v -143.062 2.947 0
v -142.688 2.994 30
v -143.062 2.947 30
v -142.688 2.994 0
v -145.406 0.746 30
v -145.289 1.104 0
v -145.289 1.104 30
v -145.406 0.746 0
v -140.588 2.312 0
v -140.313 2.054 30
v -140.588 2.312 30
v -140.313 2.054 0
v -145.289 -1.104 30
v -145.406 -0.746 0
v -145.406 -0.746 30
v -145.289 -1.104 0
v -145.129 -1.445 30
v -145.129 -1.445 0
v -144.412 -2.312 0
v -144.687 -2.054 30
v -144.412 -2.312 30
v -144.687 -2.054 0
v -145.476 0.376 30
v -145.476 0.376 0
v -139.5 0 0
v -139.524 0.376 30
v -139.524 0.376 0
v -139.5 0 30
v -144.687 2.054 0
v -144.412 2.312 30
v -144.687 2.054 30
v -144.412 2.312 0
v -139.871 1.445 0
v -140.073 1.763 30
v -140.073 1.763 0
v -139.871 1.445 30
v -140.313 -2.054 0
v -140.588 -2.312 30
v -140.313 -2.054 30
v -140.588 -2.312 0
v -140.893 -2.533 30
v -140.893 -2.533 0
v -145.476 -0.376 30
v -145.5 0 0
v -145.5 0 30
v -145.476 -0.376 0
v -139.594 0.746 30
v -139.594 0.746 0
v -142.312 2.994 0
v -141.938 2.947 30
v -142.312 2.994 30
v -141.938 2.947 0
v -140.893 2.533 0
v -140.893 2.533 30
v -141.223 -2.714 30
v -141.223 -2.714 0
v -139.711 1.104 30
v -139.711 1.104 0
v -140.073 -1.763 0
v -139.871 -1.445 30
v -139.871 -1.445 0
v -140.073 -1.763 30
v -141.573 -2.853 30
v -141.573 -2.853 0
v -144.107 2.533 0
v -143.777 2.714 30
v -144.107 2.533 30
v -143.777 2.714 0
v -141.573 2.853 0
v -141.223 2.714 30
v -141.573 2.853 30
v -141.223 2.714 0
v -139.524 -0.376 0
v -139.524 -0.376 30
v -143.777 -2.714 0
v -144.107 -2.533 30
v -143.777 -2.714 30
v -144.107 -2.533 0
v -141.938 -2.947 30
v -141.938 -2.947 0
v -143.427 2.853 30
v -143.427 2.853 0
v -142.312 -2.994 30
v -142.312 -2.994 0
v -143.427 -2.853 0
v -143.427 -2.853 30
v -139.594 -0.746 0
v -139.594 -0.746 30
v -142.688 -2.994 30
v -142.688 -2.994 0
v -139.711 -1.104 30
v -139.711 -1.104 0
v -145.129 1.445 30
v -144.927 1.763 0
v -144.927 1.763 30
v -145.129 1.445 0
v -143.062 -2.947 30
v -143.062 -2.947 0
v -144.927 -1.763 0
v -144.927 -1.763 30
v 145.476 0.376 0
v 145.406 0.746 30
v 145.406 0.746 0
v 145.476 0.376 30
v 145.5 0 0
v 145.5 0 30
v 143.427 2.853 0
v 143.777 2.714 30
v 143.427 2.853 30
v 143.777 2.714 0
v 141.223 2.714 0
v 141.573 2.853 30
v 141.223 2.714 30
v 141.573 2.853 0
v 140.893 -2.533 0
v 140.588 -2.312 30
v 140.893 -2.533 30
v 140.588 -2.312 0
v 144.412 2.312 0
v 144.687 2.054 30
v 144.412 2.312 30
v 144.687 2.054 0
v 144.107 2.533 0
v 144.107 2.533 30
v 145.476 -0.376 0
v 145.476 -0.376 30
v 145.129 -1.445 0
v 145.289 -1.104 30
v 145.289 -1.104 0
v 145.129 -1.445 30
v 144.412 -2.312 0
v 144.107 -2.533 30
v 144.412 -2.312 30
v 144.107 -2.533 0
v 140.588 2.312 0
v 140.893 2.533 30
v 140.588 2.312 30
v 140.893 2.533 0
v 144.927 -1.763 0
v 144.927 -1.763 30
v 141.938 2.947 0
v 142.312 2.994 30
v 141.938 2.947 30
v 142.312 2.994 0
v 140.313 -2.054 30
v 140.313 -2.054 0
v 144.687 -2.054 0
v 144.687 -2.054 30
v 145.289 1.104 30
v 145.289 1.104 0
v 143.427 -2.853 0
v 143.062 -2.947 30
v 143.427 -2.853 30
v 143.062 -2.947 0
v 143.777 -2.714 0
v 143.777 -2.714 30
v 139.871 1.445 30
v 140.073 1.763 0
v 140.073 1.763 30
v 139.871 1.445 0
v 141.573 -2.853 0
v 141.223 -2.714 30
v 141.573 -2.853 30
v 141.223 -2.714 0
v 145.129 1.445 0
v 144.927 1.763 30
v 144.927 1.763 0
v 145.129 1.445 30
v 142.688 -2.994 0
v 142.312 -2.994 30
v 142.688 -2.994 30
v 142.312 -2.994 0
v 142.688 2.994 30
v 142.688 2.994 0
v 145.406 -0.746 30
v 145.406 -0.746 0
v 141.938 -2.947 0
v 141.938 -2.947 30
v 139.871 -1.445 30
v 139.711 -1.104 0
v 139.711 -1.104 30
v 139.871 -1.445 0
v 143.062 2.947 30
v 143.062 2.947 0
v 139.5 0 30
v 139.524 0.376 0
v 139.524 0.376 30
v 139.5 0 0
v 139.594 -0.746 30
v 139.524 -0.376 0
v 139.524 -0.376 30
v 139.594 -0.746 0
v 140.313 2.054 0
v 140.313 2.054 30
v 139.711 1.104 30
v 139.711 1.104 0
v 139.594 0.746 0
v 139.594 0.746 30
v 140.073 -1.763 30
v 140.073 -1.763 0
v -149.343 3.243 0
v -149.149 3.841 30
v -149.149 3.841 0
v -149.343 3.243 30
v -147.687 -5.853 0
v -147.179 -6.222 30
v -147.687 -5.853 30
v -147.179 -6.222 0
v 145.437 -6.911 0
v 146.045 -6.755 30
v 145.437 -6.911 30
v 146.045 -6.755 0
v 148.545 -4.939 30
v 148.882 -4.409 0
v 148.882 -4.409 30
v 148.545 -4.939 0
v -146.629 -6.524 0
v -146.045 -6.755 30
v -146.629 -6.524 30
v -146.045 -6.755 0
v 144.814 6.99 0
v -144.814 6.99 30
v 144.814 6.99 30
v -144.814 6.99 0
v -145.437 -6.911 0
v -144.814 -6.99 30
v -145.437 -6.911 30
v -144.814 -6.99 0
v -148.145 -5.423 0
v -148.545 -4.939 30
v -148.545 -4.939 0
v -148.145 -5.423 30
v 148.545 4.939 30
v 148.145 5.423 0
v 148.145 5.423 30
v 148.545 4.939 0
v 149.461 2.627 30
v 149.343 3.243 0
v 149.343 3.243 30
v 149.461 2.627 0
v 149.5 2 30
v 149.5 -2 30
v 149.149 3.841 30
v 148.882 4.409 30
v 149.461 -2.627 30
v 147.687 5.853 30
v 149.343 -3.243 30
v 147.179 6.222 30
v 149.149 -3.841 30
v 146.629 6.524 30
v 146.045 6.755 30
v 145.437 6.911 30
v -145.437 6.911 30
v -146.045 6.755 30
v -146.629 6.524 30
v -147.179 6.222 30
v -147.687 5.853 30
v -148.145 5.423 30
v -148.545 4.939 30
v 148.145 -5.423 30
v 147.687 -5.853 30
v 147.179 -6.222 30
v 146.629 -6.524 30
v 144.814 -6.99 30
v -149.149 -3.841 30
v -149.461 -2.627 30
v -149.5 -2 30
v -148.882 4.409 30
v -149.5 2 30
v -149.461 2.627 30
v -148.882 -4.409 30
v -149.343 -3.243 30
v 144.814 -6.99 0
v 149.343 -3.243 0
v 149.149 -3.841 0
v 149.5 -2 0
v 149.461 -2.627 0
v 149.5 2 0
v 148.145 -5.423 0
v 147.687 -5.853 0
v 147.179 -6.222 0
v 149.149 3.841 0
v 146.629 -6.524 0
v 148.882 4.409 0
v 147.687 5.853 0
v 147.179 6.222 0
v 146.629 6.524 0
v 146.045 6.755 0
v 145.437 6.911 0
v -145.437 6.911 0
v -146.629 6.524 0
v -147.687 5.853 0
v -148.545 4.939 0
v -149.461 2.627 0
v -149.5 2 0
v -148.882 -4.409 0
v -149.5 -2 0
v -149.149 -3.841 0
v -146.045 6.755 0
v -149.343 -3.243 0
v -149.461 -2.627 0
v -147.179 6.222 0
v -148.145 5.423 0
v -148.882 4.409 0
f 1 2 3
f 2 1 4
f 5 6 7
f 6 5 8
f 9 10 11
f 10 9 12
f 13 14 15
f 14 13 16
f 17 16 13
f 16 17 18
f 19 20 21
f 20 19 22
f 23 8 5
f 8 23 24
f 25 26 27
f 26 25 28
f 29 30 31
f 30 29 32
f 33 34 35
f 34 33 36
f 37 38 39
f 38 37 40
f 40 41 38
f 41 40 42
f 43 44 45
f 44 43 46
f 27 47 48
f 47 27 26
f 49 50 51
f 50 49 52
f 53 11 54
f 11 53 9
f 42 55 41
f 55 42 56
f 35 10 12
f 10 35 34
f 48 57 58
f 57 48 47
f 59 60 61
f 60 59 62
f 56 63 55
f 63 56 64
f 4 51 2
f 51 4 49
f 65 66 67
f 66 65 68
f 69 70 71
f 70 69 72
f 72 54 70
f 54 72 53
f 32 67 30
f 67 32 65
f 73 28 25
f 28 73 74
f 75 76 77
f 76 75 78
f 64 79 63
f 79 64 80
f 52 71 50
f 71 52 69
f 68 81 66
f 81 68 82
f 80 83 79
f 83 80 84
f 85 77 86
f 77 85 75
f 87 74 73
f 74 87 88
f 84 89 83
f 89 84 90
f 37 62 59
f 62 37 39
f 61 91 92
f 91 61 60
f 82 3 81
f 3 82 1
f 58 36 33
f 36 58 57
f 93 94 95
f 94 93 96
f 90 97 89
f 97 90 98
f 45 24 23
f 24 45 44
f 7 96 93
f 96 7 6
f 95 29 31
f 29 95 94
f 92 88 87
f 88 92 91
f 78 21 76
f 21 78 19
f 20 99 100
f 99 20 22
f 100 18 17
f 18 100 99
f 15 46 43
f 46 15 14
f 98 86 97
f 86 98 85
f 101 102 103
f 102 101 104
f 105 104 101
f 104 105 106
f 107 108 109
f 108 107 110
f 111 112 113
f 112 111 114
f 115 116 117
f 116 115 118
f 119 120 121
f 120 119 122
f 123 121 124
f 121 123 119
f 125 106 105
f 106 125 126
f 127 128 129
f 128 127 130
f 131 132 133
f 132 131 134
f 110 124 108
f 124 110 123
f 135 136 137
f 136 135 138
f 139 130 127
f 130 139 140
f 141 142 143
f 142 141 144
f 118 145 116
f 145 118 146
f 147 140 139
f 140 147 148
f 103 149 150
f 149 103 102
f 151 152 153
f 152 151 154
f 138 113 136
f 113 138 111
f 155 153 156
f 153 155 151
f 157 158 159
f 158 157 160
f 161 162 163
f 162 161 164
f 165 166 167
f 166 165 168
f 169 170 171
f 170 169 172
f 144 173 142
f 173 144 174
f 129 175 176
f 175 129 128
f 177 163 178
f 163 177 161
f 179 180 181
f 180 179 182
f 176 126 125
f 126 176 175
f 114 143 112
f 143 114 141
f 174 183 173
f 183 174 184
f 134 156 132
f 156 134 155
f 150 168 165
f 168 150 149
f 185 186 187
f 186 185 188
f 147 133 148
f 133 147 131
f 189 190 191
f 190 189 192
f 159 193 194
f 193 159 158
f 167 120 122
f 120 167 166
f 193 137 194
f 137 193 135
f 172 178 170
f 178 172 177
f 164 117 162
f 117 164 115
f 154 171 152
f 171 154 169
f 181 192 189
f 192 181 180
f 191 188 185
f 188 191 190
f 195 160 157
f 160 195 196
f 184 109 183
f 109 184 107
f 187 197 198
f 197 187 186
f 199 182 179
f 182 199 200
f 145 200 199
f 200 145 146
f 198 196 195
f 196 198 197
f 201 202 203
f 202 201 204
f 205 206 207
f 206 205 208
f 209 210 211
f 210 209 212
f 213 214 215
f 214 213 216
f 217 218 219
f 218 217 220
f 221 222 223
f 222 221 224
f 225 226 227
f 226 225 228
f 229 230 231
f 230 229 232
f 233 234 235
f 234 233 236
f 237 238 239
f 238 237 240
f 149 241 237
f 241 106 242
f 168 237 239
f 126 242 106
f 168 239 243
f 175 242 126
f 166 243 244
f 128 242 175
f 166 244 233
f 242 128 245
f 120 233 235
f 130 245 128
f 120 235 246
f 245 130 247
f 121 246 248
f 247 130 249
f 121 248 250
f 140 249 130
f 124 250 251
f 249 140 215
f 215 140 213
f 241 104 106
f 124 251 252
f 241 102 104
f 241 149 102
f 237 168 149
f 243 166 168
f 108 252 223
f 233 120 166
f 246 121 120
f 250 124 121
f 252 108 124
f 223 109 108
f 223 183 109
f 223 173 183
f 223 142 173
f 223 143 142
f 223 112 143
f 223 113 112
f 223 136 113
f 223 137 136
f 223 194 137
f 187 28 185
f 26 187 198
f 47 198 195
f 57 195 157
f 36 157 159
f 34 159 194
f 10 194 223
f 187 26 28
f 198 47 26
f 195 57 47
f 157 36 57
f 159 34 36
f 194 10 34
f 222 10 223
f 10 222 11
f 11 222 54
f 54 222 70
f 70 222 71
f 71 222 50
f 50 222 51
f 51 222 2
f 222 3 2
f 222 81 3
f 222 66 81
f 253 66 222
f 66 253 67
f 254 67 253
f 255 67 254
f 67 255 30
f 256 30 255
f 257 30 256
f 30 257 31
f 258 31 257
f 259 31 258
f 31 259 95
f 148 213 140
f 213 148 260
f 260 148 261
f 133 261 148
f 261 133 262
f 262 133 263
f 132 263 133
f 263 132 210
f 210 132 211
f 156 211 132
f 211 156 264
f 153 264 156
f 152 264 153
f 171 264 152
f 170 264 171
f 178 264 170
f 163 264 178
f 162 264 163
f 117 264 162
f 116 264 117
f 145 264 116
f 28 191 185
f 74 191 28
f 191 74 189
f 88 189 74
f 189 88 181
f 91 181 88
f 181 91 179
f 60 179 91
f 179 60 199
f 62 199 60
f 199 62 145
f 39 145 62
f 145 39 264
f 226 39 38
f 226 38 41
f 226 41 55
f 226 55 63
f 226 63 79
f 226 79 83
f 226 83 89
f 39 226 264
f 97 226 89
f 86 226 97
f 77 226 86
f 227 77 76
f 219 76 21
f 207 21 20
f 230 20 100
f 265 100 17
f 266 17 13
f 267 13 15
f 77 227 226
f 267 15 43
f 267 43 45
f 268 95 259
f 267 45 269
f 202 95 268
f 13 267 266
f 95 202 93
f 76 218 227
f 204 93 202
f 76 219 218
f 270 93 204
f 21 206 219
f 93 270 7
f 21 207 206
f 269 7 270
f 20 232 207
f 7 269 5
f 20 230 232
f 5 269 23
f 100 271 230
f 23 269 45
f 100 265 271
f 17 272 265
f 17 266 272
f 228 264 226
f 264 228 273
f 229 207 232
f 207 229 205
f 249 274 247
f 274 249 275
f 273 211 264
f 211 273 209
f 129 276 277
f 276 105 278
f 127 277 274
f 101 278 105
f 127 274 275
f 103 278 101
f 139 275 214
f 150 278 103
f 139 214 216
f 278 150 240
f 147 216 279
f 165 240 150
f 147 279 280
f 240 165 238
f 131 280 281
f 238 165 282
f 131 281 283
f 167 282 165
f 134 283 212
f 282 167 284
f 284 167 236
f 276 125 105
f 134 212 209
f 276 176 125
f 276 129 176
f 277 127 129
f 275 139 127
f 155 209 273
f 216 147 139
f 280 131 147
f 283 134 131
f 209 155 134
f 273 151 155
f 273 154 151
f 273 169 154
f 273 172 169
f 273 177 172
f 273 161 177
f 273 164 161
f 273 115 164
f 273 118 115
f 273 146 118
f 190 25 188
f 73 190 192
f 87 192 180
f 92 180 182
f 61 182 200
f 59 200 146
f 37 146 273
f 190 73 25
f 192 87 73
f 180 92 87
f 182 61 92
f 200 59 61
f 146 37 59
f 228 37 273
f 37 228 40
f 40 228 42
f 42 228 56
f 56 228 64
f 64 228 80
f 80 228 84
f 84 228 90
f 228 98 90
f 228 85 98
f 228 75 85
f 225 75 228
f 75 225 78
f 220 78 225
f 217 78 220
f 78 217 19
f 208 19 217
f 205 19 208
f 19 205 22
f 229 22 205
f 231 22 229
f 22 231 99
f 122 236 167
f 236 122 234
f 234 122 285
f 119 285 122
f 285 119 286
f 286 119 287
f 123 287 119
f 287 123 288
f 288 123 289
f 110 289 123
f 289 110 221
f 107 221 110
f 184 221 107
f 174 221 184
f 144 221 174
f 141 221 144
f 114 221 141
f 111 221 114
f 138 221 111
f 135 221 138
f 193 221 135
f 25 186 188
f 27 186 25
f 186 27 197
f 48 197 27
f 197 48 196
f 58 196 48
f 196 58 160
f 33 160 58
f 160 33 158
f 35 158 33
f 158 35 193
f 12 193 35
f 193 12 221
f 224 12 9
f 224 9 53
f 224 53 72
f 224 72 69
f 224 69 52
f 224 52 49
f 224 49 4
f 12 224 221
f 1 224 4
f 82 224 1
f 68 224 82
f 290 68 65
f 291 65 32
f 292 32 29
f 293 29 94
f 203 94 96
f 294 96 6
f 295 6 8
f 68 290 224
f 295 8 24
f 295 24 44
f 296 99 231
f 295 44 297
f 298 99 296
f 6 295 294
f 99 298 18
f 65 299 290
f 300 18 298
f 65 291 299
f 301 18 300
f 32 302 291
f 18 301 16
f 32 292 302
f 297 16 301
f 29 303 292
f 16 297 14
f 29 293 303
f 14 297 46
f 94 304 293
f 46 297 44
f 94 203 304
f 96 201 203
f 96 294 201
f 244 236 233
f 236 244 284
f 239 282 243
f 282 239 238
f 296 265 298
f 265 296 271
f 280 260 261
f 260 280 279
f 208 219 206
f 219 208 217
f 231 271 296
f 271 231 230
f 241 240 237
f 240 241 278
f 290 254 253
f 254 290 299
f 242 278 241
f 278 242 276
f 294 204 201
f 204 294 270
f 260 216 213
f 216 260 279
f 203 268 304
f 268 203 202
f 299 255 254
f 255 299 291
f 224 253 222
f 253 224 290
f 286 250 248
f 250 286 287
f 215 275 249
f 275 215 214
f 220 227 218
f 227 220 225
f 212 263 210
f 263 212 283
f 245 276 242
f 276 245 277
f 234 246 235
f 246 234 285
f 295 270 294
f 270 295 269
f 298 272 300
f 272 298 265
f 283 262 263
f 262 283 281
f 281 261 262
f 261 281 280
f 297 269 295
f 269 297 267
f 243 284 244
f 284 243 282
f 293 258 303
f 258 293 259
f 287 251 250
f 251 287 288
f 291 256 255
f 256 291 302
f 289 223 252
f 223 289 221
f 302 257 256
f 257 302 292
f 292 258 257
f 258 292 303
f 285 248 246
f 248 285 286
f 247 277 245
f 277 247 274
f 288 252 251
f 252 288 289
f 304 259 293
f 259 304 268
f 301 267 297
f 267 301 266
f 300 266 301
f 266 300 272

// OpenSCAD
$fn = 50;


difference() {
	union() {
		hull() {
			translate(v = [-144.5000000000, 2.0000000000, 0]) {
				cylinder(h = 30, r = 5);
			}
			translate(v = [144.5000000000, 2.0000000000, 0]) {
				cylinder(h = 30, r = 5);
			}
			translate(v = [-144.5000000000, -2.0000000000, 0]) {
				cylinder(h = 30, r = 5);
			}
			translate(v = [144.5000000000, -2.0000000000, 0]) {
				cylinder(h = 30, r = 5);
			}
		}
	}
	union() {
		translate(v = [-142.5000000000, 0.0000000000, -100.0000000000]) {
			cylinder(h = 200, r = 3.0000000000);
		}
		translate(v = [-142.5000000000, 0.0000000000, -100.0000000000]) {
			cylinder(h = 200, r = 3.0000000000);
		}
		translate(v = [142.5000000000, 0.0000000000, -100.0000000000]) {
			cylinder(h = 200, r = 3.0000000000);
		}
		translate(v = [142.5000000000, 0.0000000000, -100.0000000000]) {
			cylinder(h = 200, r = 3.0000000000);
		}
	}
}
